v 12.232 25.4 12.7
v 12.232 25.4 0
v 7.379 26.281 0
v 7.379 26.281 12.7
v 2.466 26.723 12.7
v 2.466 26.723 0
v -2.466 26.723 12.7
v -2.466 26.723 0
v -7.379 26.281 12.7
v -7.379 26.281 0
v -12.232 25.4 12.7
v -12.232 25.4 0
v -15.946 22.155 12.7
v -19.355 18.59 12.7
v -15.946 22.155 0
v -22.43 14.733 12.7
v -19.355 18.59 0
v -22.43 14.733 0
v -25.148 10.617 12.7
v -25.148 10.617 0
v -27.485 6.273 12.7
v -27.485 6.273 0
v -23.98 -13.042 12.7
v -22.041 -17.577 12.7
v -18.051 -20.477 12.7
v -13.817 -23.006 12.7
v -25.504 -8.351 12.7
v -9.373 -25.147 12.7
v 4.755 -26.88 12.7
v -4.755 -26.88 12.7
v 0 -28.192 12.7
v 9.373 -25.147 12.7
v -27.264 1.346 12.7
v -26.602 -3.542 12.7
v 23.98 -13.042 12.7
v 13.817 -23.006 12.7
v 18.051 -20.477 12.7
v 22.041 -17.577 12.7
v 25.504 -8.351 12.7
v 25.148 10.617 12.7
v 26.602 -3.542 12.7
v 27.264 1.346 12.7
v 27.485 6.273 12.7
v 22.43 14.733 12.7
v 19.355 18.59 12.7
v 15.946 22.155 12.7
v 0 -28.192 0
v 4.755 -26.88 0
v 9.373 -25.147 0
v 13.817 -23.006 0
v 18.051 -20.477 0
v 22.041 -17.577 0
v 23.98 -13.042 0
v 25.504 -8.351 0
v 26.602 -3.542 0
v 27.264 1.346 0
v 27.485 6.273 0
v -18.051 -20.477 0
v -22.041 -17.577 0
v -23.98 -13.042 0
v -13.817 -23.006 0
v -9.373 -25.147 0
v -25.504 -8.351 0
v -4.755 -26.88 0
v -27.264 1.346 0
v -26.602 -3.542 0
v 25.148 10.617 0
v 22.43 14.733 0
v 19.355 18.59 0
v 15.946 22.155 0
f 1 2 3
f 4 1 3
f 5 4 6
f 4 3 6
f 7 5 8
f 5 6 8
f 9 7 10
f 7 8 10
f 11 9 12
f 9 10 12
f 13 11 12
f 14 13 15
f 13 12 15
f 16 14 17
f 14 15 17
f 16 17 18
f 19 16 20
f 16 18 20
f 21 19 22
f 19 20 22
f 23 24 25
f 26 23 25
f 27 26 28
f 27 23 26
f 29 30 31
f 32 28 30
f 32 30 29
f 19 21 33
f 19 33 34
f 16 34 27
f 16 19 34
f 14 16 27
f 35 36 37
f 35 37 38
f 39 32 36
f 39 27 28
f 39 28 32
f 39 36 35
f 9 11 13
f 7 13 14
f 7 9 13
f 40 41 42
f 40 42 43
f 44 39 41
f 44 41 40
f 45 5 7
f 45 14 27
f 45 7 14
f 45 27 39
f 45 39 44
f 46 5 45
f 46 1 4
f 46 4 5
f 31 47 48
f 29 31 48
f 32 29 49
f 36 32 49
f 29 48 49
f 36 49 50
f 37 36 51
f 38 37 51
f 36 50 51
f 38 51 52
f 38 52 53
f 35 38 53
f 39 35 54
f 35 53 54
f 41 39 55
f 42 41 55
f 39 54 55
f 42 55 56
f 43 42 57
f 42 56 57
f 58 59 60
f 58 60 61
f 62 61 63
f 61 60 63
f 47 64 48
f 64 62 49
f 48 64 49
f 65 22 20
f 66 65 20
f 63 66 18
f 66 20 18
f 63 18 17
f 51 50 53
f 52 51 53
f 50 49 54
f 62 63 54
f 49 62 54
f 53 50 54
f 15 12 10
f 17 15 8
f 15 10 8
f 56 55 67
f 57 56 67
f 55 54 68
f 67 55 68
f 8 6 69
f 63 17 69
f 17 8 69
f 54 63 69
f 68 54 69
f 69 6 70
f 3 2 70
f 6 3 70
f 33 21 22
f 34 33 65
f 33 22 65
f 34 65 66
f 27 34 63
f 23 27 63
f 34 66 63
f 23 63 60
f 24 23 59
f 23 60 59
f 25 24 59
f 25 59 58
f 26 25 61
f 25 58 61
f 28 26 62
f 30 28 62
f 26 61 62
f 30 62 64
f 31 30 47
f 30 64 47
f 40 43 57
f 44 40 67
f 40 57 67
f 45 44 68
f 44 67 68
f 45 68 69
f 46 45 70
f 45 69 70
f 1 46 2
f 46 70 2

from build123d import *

# Parameters (mm, degrees)
F1_DEPTH = 12.7


with BuildPart() as f1:
    # F0 (on Top) → F1 (new body)
    with BuildSketch(Plane.XY):
        with BuildLine():
            ThreePointArc((27.485044, 6.273282), (20.936051, 16.695944), (12.231995, 25.4))
            ThreePointArc((12.231995, 25.4), (0, 26.778215), (-12.231995, 25.4))
            ThreePointArc((-12.231995, 25.4), (-20.936051, 16.695944), (-27.485044, 6.273282))
            ThreePointArc((-27.485044, 6.273282), (-26.106829, -5.958713), (-22.041294, -17.577345))
            ThreePointArc((-22.041294, -17.577345), (-11.618632, -24.126338), (0, -28.191873))
            ThreePointArc((0, -28.191873), (11.618632, -24.126338), (22.041294, -17.577345))
            ThreePointArc((22.041294, -17.577345), (26.106829, -5.958713), (27.485044, 6.273282))
        make_face()
    extrude(amount=F1_DEPTH)


solid = f1.part
